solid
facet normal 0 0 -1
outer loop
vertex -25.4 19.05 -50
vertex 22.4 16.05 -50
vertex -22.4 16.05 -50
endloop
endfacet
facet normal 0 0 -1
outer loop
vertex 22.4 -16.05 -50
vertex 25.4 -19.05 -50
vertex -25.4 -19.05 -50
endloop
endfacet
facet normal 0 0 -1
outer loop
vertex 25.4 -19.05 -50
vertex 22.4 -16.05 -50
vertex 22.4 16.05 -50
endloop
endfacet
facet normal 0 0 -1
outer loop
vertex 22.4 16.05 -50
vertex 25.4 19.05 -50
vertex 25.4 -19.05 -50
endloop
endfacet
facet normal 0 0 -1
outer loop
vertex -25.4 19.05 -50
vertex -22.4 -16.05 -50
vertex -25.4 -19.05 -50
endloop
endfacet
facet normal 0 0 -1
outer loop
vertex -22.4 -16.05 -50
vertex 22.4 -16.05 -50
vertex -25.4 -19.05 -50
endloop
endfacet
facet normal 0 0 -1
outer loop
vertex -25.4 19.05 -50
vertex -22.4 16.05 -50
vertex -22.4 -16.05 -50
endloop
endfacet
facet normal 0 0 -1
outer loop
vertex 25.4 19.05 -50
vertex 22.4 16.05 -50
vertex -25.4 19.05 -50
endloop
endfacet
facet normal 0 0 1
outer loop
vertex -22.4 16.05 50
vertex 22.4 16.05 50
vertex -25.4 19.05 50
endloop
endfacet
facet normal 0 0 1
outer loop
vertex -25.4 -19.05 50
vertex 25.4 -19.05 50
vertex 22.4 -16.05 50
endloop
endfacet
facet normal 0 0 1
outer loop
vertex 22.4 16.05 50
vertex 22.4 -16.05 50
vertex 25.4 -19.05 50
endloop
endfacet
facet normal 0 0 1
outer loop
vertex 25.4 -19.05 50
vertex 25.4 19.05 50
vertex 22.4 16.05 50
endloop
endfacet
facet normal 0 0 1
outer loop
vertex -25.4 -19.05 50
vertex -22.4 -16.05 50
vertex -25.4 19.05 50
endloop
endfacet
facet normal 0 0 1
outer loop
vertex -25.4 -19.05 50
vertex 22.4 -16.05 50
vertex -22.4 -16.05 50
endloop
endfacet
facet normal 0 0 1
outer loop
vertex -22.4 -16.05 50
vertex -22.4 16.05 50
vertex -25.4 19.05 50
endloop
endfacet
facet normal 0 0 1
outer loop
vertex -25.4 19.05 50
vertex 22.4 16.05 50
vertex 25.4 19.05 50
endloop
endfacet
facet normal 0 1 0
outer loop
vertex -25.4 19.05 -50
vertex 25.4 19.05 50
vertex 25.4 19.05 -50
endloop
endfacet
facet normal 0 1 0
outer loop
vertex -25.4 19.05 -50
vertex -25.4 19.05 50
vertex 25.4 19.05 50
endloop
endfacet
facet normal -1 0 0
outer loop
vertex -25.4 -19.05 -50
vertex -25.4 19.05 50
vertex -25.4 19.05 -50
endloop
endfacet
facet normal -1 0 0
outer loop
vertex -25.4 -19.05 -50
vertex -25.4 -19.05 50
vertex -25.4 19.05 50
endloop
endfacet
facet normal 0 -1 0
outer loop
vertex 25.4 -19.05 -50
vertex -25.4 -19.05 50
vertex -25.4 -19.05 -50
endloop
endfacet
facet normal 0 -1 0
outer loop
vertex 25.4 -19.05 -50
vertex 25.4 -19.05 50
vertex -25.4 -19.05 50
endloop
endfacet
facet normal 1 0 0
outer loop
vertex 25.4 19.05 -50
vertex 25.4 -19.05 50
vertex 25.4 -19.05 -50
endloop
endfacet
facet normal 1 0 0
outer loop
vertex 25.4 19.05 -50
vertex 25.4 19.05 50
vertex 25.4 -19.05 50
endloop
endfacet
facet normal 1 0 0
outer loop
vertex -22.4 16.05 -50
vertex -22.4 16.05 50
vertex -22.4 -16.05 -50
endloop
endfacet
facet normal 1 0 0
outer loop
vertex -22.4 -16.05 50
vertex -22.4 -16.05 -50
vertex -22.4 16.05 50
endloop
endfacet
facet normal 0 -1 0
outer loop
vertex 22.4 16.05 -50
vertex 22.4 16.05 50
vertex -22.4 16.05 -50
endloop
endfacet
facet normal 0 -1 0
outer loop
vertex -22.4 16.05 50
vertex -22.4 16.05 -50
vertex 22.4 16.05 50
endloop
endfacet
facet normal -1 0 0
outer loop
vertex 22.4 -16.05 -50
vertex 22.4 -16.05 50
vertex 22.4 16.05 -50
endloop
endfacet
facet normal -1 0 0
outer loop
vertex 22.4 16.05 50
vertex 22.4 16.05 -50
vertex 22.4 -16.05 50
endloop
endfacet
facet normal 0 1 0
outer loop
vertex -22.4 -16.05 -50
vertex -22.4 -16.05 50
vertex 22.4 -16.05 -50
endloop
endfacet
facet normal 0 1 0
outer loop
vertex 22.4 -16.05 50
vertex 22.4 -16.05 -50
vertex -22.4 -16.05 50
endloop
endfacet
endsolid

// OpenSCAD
// Aluminium rectangular box section (rectangular tube)
// 50.8mm x 38.1mm x 3.0mm wall, length configurable

outer_width_mm     = 50.8;  // X
outer_height_mm    = 38.1;  // Y
wall_thickness_mm  = 3.0;   // wall thickness
length_mm          = 100.0; // Z (tube length)
eps_mm             = 0.05;  // small overlap for robust boolean

module rectangular_box_section(ow, oh, t, L, eps=0.05) {
    // Inner dimensions (must remain positive)
    iw = ow - 2*t;
    ih = oh - 2*t;

    assert(iw > 0 && ih > 0, "Wall thickness too large for given outer dimensions.");

    // Build as a 2D ring and linear_extrude to guarantee open ends and visible hollow in end views
    color("Silver")
    linear_extrude(height=L, center=true, convexity=10)
        difference() {
            square([ow, oh], center=true);
            square([iw, ih], center=true);
        }
}

rectangular_box_section(outer_width_mm, outer_height_mm, wall_thickness_mm, length_mm, eps_mm);
